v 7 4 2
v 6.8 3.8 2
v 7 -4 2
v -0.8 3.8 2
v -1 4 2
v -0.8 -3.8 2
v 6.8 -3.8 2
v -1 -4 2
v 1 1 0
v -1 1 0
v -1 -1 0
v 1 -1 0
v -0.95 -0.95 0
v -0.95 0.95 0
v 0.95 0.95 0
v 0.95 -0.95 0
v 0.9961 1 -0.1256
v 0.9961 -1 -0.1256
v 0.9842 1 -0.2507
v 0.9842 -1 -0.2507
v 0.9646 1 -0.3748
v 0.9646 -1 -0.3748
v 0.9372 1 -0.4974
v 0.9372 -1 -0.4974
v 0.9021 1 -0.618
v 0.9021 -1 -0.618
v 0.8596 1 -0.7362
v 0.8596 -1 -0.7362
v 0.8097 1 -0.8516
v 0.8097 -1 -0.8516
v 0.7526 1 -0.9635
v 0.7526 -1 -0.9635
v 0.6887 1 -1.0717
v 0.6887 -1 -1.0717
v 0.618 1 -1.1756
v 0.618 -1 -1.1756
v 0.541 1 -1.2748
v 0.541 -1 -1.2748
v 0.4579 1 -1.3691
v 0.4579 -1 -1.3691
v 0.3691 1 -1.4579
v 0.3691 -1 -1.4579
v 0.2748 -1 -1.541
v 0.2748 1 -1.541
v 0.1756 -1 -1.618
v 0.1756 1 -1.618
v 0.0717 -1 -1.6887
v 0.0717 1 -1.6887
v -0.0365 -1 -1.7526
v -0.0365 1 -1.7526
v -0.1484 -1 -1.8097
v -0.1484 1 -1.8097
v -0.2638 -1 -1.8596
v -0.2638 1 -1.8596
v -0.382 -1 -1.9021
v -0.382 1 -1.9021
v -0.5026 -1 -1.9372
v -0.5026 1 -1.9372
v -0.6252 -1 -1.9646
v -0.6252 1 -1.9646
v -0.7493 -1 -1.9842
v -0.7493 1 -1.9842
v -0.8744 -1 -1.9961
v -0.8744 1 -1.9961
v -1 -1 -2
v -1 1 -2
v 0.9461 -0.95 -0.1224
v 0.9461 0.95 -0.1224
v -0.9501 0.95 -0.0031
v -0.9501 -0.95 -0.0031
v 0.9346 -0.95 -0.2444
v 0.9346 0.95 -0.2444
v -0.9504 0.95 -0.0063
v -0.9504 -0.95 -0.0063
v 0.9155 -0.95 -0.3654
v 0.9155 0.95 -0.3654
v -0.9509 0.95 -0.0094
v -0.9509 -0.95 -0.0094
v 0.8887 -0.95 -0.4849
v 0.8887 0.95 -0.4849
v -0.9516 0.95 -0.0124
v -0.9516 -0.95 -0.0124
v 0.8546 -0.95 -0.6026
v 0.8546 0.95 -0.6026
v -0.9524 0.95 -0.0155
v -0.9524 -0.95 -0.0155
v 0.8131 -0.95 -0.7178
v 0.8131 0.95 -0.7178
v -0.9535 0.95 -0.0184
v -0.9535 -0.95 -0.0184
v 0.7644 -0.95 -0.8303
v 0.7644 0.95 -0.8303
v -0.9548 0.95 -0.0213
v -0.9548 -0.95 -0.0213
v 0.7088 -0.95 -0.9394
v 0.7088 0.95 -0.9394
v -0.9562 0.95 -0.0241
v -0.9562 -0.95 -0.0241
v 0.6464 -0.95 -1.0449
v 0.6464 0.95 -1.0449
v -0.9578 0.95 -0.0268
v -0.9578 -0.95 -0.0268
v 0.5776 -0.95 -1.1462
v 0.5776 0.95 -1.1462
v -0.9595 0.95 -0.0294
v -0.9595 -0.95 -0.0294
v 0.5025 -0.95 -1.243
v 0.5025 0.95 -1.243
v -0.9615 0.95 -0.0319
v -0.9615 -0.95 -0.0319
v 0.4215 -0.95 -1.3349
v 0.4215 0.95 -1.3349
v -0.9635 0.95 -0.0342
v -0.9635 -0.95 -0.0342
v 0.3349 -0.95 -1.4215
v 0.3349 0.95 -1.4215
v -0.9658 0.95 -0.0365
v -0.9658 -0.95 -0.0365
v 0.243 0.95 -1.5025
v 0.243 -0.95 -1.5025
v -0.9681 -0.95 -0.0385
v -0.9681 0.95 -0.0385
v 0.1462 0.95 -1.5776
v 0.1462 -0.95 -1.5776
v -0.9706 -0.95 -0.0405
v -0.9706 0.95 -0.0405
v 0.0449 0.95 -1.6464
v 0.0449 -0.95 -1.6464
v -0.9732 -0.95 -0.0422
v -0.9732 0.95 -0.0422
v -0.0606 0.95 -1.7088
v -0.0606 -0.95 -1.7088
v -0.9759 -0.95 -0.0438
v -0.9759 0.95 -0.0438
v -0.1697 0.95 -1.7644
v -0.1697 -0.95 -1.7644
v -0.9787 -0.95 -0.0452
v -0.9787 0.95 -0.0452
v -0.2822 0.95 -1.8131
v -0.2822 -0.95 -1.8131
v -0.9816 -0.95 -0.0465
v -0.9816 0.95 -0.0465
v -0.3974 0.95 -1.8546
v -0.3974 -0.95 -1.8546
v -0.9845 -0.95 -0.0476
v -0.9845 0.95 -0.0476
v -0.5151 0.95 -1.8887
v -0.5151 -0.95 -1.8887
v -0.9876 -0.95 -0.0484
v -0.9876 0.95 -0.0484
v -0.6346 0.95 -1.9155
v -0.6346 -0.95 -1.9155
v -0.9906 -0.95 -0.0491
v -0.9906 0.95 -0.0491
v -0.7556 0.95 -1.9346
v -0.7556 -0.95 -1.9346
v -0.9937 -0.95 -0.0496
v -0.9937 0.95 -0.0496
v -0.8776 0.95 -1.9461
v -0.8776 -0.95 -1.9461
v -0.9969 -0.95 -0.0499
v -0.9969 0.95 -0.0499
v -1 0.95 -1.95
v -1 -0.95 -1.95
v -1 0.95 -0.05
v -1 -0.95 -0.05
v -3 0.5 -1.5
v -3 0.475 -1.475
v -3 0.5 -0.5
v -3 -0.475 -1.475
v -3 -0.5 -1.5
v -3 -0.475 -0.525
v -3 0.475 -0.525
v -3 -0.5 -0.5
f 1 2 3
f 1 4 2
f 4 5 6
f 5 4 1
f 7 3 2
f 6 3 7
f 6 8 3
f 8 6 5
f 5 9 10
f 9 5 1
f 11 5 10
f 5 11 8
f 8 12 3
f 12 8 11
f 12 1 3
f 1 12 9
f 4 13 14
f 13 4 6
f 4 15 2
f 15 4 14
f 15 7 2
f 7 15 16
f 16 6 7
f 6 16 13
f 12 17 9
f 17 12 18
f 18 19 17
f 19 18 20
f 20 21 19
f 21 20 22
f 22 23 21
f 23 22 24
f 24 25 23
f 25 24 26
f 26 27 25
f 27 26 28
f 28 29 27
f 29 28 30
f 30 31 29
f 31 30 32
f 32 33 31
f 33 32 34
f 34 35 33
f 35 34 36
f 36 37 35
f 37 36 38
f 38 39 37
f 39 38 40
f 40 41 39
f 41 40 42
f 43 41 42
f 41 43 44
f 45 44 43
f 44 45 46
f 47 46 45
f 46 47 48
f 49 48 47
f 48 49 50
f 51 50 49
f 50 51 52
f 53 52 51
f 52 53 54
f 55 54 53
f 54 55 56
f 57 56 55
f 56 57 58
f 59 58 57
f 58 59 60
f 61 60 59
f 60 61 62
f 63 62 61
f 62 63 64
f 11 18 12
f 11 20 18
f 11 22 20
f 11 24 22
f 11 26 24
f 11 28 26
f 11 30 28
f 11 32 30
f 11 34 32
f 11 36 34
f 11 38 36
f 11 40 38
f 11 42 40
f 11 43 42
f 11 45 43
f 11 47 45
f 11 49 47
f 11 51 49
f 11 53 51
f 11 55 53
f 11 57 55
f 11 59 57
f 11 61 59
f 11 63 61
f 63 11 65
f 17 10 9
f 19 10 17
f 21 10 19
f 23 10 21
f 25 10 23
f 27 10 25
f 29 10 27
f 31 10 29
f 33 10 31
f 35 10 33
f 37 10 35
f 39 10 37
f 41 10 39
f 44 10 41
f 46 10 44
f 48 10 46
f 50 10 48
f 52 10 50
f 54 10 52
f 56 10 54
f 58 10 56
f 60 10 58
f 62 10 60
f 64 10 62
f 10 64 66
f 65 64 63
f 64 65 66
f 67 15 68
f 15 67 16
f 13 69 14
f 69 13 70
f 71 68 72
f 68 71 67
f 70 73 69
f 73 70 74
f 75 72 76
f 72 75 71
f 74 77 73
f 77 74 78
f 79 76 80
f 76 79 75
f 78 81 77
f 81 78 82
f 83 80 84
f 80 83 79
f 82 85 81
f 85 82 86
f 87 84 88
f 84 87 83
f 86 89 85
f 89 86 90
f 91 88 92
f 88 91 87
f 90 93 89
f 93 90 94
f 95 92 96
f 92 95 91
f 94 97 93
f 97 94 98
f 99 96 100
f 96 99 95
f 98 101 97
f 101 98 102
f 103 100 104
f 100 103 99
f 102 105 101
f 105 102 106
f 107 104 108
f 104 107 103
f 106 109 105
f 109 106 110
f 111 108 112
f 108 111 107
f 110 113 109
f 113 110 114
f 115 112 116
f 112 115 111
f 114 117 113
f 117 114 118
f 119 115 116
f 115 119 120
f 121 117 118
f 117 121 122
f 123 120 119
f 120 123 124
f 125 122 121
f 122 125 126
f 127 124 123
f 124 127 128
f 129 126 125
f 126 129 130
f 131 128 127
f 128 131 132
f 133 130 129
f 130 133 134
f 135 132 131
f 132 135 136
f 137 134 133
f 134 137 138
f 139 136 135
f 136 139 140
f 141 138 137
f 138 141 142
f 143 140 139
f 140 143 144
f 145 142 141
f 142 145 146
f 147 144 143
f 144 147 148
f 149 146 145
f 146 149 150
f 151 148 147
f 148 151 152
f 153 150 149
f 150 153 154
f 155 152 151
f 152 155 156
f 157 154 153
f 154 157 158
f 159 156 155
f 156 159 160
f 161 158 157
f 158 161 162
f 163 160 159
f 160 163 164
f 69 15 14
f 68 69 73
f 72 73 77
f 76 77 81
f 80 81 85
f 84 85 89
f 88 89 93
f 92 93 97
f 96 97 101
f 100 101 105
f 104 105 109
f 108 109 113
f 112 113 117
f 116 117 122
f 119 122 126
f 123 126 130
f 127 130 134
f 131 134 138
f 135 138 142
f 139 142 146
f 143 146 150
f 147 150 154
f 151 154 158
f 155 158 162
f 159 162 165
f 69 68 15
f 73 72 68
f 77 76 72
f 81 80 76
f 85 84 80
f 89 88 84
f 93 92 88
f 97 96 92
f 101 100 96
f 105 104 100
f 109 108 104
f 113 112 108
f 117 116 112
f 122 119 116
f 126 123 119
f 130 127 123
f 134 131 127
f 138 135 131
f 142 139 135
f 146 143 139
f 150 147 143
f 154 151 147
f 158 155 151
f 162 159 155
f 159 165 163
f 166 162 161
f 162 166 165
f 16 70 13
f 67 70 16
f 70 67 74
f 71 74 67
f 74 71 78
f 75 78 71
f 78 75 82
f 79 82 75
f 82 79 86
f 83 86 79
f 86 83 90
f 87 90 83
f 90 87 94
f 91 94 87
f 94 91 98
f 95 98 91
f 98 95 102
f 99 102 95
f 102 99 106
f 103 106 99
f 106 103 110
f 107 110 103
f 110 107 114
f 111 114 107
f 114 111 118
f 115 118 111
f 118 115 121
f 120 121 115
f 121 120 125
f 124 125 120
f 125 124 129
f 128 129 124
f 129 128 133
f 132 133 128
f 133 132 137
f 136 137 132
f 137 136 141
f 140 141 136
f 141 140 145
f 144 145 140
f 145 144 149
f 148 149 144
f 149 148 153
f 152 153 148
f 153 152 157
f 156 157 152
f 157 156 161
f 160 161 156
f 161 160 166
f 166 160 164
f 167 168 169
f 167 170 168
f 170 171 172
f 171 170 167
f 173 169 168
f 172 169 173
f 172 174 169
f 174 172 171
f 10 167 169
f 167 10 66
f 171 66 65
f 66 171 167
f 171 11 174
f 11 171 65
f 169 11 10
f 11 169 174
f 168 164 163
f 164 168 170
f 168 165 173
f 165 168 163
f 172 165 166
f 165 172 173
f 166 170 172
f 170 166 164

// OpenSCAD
funnelWidth = 2;
funnelHeight = 0.5;
funnelThickness=0.05;
extrudeHeight = 2;

module shearX_Z(s) {
    multmatrix([
        [1, 0, s, 0],
        [0, 1, 0, 0],
        [0, 0, 1, 0]
    ])
    children();
}

module funnelCupFrame(w,h,t,e){
    translate([0,0,e/2])
    linear_extrude(height = e,convexity = 3, scale=4,center=true)
    difference() {
        square([w,w],center=true);
        offset(delta = -t) square([w,w],center=true);
    }
}

module funnelOutlet (w,t){
    translate([-w/2,0,0])
    rotate([-90,0,0])
    translate([0,0,-w/2])
    rotate_extrude(angle=90, convexity=10,$fn=100) 
    difference() {
        square([w,w]);
        offset(delta = -t) square([w,w]);
    }
    
}

module outletPipe(w,t,e){
    translate([-w/2,0,-w/2])
    rotate([0,-90,0]) 
    linear_extrude(height = e, scale = 0.5)
    difference() {
        square([w,w],center=true);
        offset(delta = -t) square([w,w],center=true);
    }
}


module funnel() {

shearX_Z(1.5)
funnelCupFrame(w=funnelWidth,h=funnelHeight,t=funnelThickness, e= extrudeHeight);

funnelOutlet(w=funnelWidth, t=funnelThickness);

outletPipe(w=funnelWidth, t=funnelThickness, e= extrudeHeight);

}

funnel();
